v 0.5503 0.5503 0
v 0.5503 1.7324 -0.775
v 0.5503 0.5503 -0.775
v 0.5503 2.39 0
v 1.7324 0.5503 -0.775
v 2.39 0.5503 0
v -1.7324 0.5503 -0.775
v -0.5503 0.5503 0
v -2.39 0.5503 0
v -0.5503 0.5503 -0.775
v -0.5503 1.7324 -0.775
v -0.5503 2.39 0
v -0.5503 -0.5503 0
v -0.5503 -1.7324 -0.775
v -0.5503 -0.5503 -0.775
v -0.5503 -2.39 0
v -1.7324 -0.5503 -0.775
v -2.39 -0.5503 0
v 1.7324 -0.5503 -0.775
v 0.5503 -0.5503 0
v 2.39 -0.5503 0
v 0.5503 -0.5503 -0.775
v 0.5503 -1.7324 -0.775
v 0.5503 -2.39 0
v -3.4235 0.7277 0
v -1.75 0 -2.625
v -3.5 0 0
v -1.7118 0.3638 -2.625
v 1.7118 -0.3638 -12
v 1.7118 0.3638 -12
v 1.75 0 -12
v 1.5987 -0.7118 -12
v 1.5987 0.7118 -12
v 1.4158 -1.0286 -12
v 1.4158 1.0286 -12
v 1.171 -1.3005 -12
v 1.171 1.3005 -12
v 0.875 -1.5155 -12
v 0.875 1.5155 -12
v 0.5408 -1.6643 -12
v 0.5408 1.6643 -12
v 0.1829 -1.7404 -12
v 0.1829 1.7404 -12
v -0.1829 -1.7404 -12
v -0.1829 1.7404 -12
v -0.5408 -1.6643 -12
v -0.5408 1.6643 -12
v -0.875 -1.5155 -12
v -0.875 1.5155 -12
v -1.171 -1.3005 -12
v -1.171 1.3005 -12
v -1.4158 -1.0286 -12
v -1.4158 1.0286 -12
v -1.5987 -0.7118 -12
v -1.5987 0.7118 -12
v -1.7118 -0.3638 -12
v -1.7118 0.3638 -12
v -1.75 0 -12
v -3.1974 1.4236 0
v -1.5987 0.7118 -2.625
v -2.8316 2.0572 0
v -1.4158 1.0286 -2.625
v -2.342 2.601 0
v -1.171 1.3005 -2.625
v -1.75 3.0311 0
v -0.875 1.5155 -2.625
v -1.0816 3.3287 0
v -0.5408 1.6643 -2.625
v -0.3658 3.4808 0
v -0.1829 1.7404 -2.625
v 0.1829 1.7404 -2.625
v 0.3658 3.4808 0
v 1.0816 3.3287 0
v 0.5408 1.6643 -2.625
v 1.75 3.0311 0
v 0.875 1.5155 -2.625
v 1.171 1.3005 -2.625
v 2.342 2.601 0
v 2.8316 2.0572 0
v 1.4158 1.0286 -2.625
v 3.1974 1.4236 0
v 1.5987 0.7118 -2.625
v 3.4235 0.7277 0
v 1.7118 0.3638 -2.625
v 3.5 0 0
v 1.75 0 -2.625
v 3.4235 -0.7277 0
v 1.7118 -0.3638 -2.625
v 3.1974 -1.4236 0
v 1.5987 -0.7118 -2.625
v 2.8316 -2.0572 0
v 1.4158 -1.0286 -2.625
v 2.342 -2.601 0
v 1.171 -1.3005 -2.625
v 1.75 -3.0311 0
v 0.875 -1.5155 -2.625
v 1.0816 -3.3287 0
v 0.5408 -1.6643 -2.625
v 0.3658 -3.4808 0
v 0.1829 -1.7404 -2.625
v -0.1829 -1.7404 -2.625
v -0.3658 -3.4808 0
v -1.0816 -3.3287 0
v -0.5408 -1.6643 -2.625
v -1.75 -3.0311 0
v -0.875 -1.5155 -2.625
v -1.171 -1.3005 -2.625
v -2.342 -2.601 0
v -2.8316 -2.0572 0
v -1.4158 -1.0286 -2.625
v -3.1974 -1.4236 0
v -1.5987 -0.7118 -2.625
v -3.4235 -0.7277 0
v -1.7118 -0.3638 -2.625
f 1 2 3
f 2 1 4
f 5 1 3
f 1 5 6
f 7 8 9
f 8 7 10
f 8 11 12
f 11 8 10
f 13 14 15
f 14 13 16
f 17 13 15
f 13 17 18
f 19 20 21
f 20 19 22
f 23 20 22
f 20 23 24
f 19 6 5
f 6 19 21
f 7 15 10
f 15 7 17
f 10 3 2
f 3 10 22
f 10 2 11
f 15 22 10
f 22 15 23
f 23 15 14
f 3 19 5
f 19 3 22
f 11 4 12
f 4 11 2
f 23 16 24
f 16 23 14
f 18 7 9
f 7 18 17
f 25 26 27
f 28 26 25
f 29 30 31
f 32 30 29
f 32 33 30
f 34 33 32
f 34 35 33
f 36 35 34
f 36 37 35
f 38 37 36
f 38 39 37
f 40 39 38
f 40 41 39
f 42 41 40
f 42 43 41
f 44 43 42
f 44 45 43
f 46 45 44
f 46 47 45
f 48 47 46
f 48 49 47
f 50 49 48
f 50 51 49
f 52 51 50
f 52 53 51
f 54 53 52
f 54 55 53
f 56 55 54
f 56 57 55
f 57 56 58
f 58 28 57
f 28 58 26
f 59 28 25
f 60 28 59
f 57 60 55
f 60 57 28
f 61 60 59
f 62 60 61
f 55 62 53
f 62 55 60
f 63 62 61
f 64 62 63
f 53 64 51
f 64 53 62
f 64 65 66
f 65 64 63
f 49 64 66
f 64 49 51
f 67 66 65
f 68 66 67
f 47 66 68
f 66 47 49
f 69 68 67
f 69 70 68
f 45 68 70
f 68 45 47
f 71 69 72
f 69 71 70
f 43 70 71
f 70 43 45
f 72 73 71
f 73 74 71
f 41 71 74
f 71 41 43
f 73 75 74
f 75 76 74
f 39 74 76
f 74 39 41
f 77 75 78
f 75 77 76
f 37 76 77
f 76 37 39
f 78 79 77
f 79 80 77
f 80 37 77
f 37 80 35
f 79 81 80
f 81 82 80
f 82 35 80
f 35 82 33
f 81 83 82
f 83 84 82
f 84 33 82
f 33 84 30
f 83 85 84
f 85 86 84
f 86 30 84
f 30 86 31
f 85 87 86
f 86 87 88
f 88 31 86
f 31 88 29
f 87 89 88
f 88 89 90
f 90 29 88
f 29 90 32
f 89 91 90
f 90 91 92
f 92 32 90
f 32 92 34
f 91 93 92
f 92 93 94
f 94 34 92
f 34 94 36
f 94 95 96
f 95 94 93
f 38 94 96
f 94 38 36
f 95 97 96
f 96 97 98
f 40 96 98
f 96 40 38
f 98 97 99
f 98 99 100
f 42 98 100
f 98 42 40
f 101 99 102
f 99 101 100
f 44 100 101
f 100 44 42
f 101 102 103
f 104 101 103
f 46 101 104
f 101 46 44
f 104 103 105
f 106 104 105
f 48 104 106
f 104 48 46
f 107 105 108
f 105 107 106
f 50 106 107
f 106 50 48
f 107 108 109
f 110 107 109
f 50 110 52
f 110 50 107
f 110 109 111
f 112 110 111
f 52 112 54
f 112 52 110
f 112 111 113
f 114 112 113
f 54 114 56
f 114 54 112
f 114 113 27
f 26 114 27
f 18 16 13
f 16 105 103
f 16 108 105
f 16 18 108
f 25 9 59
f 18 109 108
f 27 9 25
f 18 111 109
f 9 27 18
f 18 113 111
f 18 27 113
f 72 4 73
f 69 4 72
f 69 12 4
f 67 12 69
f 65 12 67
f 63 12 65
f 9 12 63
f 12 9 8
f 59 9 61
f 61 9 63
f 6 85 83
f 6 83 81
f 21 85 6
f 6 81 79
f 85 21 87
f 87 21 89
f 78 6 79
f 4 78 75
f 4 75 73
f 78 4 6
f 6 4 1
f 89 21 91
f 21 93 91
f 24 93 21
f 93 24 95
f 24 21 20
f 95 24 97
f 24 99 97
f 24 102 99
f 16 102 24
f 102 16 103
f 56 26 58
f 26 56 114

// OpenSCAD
// created by IndiePandaaaaa | Lukas

function cone_diameter(diameter) = diameter * 2;

function cone_height(diameter) = diameter * 0.75;

module screw(diameter, length, cutout_sample = false, fs = 0.1, fa = 1) {
    //$fs = 0.1; [size in mm] | $fa = 1; [degrees]
    //$fn = 100; [defined faces]

    module base_model(diameter, length, cone_height, cone_diameter, offset = 0, fs = 0.1, fa = 1) {
        rotate_extrude($fs = fs) {
            polygon([
                    [0, 0],
                    [(diameter + offset) / 2, 0],
                    [(diameter + offset) / 2, (length + offset) - (cone_height + offset)],
                    [(cone_diameter + offset) / 2, length + offset],
                    [0, length + offset],
                ]);
        }
    }

    if (length < diameter) {
        echo("Screw is too short");
        length = diameter + 1;
        echo("New length is: ", length);
    }

    if (!cutout_sample) {
        translate([0, 0, - length])
            difference() {
                base_model(diameter, length, cone_height(diameter), cone_diameter(diameter));

                // top cross part
                translate([0, 0, length + 0.1 - (cone_height(diameter) - diameter / 2)])
                    difference() {
                        rotate([0, 0, 45])
                            rotate_extrude($fn = 4) {
                                polygon([
                                        [0, 0],
                                        [diameter * 1.4 / 2, 0],
                                        [cone_diameter(diameter) / 2, cone_height(diameter) - diameter / 2],
                                        [0, cone_height(diameter) - diameter / 2],
                                    ]);
                            }
                        for (i = [0 : 1 : 3]) {
                            rotate([0, 0, 90 * i])
                                translate([diameter / 3.18 / 2, diameter / 3.18 / 2, - 0.1])
                                    cube(cone_height(diameter) + 0.2);
                        }
                    }
            }
    } else {
        offset = 0.2;
        translate([0, 0, - length - offset / 2])
            base_model(diameter, length, cone_height(diameter), cone_diameter(diameter), offset);
    }
}

screw(3.5, 12);
